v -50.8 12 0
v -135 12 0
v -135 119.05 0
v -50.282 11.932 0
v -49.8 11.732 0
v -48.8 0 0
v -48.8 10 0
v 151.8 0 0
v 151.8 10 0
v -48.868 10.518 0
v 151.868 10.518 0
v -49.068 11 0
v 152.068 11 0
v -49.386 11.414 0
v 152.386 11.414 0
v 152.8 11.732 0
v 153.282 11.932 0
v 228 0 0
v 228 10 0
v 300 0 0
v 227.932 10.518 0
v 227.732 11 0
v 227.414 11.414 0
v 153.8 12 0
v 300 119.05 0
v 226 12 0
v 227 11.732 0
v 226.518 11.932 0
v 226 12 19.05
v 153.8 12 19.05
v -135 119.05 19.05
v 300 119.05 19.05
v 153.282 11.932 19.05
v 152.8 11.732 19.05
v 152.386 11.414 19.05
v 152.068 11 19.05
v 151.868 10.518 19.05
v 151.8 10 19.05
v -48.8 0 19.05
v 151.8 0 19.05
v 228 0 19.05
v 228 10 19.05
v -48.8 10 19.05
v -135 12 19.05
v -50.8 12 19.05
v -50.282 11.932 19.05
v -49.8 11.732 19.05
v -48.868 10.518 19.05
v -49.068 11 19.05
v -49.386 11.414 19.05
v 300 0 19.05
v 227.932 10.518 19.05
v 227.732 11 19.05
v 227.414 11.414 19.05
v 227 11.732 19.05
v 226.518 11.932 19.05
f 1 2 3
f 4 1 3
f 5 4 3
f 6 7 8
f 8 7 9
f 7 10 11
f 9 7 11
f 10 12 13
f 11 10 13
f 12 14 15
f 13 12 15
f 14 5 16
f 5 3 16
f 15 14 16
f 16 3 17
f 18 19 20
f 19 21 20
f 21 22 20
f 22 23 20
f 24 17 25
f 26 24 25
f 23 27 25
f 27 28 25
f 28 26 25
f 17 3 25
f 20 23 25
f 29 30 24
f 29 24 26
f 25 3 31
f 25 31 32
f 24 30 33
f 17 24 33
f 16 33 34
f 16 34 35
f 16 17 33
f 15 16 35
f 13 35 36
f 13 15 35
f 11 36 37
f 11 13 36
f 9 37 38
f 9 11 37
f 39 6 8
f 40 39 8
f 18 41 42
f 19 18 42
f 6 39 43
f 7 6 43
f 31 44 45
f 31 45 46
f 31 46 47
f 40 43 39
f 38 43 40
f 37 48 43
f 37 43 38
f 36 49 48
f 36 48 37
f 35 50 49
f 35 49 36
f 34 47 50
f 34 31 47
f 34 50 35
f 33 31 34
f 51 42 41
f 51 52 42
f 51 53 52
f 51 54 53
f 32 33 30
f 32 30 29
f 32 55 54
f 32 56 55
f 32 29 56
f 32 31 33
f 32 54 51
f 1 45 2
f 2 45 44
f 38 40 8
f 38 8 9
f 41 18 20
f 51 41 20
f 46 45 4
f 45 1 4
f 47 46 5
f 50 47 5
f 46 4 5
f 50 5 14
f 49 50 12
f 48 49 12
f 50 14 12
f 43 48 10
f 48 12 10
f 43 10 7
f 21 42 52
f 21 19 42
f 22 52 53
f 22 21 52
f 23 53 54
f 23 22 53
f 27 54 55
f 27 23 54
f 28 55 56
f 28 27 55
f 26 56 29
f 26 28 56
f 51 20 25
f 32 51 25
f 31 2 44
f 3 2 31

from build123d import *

# Parameters (mm, degrees)
SKETCH1_W           = 435
SKETCH1_H           = 119.05
BOSS_EXTRUDE1_DEPTH = 19.05
SKETCH2_W           = 76.2
SKETCH2_H           = 12
CUT_EXTRUDE1_DEPTH  = 324.319973092
FILLET1_R           = 2


with BuildPart() as part:
    # Sketch1 → Boss-Extrude1 (new body)
    with BuildSketch(Plane.XY):
        with Locations((82.5, 59.525)):
            Rectangle(SKETCH1_W, SKETCH1_H)
    extrude(amount=BOSS_EXTRUDE1_DEPTH)

    # Sketch2 → Cut-Extrude1 (cut, through all)
    with BuildSketch(Plane.XY.offset(19.05)):
        Polygon((-48.8, 12), (-125, 12), (-135, 12), (-135, 0), (-125, 0), (-48.8, 0), align=None)
        with Locations((189.9, 6)):
            Rectangle(SKETCH2_W, SKETCH2_H)
    extrude(amount=-CUT_EXTRUDE1_DEPTH, mode=Mode.SUBTRACT)

    # Fillet1
    fillet1_edges = [part.edges().sort_by_distance(p)[0] for p in [
        (-48.8, 12, 9.525),
        (151.8, 12, 9.525),
        (228, 12, 9.525),
    ]]
    fillet(fillet1_edges, radius=FILLET1_R)


solid = part.part
